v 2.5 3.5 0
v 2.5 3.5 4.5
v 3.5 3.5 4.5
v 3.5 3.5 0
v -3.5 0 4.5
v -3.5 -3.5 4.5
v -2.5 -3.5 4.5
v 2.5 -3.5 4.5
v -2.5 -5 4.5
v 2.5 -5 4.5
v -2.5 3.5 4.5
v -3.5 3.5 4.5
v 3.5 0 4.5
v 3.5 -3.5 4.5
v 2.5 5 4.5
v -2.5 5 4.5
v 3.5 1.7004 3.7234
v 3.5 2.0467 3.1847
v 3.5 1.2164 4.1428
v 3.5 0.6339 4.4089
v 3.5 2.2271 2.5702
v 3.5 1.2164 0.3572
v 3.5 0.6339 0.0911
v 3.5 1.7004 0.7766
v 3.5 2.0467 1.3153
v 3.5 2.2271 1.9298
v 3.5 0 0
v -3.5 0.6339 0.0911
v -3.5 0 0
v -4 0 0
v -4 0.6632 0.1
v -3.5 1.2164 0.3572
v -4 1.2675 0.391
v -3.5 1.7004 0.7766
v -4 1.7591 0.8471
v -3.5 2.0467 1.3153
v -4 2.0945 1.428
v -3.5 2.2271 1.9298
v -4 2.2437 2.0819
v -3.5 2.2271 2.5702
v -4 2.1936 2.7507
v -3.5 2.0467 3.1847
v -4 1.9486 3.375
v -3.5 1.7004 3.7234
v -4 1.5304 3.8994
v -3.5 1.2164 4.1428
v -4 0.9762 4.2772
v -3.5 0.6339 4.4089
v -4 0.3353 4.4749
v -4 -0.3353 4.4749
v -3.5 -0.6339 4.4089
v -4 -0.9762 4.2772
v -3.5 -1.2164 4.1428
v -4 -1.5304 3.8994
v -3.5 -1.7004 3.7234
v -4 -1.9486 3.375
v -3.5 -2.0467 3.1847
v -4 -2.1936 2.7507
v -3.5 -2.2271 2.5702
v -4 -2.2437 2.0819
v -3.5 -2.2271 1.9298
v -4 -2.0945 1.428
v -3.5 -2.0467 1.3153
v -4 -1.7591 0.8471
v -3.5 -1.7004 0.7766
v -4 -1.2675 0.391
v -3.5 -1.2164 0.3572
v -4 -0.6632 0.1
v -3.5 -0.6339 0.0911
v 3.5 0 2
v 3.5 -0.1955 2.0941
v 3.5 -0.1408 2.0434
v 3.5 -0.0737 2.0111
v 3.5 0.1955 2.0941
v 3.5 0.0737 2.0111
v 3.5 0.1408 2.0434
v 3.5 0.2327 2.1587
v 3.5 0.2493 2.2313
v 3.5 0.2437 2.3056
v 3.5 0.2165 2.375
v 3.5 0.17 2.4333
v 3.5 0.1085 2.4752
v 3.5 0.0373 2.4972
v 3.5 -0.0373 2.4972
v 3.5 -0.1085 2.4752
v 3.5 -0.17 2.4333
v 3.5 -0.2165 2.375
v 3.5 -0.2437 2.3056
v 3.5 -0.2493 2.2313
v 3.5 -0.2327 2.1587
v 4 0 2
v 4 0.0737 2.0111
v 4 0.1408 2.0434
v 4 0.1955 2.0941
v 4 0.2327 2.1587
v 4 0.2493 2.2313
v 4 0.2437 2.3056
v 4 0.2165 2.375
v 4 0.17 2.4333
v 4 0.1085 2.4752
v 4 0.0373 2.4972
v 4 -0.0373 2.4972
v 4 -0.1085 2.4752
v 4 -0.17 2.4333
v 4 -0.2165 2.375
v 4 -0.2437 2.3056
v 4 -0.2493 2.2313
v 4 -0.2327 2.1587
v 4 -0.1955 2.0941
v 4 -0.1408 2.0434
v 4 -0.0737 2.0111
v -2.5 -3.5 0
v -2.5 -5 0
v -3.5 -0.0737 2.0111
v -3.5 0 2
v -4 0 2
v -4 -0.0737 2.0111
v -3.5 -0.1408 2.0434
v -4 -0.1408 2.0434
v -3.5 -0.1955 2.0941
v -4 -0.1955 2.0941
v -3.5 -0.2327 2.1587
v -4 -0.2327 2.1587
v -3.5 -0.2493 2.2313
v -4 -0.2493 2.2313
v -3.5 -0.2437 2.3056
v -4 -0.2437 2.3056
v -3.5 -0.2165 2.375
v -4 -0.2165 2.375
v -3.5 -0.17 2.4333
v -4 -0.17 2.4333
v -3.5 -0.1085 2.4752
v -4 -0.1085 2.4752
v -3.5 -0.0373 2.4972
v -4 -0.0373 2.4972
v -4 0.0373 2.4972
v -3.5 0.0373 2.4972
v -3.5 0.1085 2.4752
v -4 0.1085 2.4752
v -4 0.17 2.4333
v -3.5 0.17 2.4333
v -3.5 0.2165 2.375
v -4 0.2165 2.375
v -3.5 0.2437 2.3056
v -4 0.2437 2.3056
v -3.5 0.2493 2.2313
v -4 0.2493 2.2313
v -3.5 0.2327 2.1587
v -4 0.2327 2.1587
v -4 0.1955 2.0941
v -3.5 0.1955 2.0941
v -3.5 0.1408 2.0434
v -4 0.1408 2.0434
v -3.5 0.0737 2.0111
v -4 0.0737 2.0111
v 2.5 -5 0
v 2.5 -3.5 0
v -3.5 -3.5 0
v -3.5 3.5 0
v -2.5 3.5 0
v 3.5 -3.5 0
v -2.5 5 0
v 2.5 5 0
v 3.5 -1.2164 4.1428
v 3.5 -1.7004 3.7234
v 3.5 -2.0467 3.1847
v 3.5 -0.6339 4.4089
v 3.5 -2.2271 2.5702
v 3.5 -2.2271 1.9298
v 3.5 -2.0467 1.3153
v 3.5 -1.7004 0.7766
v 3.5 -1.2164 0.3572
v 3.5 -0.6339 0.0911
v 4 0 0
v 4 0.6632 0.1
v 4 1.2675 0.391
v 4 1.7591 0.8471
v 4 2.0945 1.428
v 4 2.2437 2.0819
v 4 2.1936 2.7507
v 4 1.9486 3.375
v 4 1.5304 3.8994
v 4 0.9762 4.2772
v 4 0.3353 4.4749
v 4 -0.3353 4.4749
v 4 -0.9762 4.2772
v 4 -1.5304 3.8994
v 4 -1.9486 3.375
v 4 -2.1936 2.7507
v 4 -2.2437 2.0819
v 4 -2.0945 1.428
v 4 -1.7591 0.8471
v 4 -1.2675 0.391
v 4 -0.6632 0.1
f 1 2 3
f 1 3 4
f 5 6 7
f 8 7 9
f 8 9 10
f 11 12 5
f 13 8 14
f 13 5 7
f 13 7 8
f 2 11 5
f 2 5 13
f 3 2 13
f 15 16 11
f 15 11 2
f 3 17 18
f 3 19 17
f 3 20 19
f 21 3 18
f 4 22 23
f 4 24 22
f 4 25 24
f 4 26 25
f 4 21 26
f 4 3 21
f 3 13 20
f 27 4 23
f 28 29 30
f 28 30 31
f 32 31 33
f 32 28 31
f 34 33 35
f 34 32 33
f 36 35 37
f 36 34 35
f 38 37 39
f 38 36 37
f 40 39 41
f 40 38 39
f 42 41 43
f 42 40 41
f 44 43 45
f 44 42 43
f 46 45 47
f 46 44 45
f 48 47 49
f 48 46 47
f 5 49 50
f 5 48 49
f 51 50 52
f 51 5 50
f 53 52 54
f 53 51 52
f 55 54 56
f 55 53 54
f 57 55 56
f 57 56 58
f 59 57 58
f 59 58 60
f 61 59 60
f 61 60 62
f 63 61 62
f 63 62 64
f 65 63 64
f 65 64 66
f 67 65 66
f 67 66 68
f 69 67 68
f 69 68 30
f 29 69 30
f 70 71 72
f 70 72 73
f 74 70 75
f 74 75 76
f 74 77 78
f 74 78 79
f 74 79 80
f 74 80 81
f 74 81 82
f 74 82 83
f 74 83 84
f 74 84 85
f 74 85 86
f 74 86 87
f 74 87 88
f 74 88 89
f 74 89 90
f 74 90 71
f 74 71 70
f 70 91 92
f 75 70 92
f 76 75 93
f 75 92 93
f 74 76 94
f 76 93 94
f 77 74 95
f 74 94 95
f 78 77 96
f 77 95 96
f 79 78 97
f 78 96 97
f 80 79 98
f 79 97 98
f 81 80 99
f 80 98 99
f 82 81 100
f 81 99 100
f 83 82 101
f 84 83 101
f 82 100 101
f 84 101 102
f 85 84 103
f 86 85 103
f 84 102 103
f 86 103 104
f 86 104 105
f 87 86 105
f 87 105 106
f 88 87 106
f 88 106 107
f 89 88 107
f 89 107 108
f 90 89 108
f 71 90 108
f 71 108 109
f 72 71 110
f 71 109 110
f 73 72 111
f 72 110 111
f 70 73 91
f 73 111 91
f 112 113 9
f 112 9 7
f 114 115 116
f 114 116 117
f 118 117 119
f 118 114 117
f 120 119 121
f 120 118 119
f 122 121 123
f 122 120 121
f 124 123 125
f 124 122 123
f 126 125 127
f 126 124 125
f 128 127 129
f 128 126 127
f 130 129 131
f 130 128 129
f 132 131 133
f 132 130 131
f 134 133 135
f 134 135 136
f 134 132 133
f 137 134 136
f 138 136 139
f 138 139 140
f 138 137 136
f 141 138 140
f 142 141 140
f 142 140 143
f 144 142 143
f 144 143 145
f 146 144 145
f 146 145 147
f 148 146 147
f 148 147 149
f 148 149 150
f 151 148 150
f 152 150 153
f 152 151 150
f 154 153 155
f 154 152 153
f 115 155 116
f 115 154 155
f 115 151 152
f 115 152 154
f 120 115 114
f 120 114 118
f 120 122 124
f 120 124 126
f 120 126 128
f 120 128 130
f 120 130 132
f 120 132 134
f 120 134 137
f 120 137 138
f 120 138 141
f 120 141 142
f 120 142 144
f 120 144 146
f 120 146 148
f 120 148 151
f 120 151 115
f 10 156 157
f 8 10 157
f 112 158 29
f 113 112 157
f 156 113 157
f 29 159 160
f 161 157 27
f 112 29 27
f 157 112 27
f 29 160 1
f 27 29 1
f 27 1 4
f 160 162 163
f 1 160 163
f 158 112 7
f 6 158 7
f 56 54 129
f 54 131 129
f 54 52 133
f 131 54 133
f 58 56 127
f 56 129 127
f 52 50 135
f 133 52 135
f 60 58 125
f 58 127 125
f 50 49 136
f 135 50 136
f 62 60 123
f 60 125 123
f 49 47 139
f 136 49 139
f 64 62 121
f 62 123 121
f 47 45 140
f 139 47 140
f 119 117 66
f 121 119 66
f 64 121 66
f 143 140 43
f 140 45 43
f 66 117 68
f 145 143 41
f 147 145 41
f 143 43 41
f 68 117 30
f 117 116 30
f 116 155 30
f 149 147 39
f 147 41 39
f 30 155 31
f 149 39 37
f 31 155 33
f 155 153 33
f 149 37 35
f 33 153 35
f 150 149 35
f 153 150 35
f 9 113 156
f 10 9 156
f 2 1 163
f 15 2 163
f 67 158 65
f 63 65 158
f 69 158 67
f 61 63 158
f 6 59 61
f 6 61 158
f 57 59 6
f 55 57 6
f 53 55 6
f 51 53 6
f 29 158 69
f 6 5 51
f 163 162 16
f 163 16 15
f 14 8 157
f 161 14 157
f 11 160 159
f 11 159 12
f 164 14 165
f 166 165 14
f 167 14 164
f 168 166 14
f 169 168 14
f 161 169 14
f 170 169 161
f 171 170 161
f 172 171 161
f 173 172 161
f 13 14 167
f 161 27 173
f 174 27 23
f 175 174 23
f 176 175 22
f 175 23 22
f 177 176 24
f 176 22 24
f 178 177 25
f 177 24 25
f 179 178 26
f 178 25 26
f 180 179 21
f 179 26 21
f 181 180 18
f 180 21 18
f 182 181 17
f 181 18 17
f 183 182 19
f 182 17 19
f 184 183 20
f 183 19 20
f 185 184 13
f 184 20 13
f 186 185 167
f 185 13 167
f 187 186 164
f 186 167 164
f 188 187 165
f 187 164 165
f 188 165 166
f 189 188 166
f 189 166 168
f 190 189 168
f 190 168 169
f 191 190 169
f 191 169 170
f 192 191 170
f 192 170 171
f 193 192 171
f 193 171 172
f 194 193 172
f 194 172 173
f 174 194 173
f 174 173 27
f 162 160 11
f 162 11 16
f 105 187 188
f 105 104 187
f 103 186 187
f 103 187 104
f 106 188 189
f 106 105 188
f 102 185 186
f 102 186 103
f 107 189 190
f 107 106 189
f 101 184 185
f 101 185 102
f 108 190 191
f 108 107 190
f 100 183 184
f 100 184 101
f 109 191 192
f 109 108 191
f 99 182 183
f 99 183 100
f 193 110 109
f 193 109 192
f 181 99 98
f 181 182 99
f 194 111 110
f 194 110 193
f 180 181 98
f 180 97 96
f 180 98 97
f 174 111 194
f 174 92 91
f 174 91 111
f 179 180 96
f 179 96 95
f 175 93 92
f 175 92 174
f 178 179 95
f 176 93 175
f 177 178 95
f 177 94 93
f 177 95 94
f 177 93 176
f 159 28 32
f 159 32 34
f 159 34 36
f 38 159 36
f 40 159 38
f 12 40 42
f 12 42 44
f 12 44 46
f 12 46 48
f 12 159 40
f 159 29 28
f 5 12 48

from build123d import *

# Parameters (mm, degrees)
SKETCH_4_W          = 5
SKETCH_4_H          = 10
EXTRUDE_2_DEPTH     = 4.5
SKETCH_5_W          = 4.5
SKETCH_5_H          = 7
EXTRUDE_3_DEPTH     = 1
SKETCH_6_W          = 4.5
SKETCH_6_H          = 7
EXTRUDE_4_DEPTH     = 1
SKETCH_7_R          = 2.25
EXTRUDE_5_DEPTH     = 0.5
SKETCH_8_R          = 0.25
CUT_EXTRUDE_1_DEPTH = 0.5
CUT_EXTRUDE_START   = -0.5
SKETCH_9_R          = 0.25
CUT_EXTRUDE_2_DEPTH = 0.5


with BuildPart() as part:
    # 草图4 → 凸台-拉伸2 (new body)
    with BuildSketch(Plane.XY):
        Rectangle(SKETCH_4_W, SKETCH_4_H)
    extrude(amount=EXTRUDE_2_DEPTH)

    # 草图5 → 凸台-拉伸3 (add)
    with BuildSketch(Plane(origin=(2.5, 0, 0), x_dir=(0, 0, -1), z_dir=(1, 0, 0))):
        with Locations((-2.25, 0)):
            Rectangle(SKETCH_5_W, SKETCH_5_H)
    extrude(amount=EXTRUDE_3_DEPTH)

    # 草图6 → 凸台-拉伸4 (add)
    with BuildSketch(Plane.ZY.offset(2.5)):
        with Locations((2.25, 0)):
            Rectangle(SKETCH_6_W, SKETCH_6_H)
    extrude(amount=EXTRUDE_4_DEPTH)

    # 草图7 → 凸台-拉伸5 (add)
    with BuildSketch(Plane(origin=(3.5, 0, 0), x_dir=(0, 0, -1), z_dir=(1, 0, 0))):
        with Locations((-2.25, 0)):
            Circle(SKETCH_7_R)
    extrude_5 = extrude(amount=EXTRUDE_5_DEPTH)

    # 镜向1: 凸台-拉伸5 across plane
    add(extrude_5.mirror(Plane(origin=(0, 0, 0), x_dir=(0, 0, 1), z_dir=(1, 0, 0))))

    # 草图8 → 切除-拉伸1 (cut)
    with BuildSketch(Plane(origin=(4, 0, 0), x_dir=(0, 0, -1), z_dir=(1, 0, 0))):
        with Locations((-2.25, 0)):
            Circle(SKETCH_8_R)
    extrude(amount=-CUT_EXTRUDE_1_DEPTH, mode=Mode.SUBTRACT)

    # 草图9 → 切除-拉伸2 (cut)
    with BuildSketch(Plane.ZY.offset(4).offset(CUT_EXTRUDE_START)):
        with Locations(Location((2.25, 0, 0), (0, 0, 180))):
            Circle(SKETCH_9_R)
    extrude(amount=CUT_EXTRUDE_2_DEPTH, mode=Mode.SUBTRACT)


solid = part.part
